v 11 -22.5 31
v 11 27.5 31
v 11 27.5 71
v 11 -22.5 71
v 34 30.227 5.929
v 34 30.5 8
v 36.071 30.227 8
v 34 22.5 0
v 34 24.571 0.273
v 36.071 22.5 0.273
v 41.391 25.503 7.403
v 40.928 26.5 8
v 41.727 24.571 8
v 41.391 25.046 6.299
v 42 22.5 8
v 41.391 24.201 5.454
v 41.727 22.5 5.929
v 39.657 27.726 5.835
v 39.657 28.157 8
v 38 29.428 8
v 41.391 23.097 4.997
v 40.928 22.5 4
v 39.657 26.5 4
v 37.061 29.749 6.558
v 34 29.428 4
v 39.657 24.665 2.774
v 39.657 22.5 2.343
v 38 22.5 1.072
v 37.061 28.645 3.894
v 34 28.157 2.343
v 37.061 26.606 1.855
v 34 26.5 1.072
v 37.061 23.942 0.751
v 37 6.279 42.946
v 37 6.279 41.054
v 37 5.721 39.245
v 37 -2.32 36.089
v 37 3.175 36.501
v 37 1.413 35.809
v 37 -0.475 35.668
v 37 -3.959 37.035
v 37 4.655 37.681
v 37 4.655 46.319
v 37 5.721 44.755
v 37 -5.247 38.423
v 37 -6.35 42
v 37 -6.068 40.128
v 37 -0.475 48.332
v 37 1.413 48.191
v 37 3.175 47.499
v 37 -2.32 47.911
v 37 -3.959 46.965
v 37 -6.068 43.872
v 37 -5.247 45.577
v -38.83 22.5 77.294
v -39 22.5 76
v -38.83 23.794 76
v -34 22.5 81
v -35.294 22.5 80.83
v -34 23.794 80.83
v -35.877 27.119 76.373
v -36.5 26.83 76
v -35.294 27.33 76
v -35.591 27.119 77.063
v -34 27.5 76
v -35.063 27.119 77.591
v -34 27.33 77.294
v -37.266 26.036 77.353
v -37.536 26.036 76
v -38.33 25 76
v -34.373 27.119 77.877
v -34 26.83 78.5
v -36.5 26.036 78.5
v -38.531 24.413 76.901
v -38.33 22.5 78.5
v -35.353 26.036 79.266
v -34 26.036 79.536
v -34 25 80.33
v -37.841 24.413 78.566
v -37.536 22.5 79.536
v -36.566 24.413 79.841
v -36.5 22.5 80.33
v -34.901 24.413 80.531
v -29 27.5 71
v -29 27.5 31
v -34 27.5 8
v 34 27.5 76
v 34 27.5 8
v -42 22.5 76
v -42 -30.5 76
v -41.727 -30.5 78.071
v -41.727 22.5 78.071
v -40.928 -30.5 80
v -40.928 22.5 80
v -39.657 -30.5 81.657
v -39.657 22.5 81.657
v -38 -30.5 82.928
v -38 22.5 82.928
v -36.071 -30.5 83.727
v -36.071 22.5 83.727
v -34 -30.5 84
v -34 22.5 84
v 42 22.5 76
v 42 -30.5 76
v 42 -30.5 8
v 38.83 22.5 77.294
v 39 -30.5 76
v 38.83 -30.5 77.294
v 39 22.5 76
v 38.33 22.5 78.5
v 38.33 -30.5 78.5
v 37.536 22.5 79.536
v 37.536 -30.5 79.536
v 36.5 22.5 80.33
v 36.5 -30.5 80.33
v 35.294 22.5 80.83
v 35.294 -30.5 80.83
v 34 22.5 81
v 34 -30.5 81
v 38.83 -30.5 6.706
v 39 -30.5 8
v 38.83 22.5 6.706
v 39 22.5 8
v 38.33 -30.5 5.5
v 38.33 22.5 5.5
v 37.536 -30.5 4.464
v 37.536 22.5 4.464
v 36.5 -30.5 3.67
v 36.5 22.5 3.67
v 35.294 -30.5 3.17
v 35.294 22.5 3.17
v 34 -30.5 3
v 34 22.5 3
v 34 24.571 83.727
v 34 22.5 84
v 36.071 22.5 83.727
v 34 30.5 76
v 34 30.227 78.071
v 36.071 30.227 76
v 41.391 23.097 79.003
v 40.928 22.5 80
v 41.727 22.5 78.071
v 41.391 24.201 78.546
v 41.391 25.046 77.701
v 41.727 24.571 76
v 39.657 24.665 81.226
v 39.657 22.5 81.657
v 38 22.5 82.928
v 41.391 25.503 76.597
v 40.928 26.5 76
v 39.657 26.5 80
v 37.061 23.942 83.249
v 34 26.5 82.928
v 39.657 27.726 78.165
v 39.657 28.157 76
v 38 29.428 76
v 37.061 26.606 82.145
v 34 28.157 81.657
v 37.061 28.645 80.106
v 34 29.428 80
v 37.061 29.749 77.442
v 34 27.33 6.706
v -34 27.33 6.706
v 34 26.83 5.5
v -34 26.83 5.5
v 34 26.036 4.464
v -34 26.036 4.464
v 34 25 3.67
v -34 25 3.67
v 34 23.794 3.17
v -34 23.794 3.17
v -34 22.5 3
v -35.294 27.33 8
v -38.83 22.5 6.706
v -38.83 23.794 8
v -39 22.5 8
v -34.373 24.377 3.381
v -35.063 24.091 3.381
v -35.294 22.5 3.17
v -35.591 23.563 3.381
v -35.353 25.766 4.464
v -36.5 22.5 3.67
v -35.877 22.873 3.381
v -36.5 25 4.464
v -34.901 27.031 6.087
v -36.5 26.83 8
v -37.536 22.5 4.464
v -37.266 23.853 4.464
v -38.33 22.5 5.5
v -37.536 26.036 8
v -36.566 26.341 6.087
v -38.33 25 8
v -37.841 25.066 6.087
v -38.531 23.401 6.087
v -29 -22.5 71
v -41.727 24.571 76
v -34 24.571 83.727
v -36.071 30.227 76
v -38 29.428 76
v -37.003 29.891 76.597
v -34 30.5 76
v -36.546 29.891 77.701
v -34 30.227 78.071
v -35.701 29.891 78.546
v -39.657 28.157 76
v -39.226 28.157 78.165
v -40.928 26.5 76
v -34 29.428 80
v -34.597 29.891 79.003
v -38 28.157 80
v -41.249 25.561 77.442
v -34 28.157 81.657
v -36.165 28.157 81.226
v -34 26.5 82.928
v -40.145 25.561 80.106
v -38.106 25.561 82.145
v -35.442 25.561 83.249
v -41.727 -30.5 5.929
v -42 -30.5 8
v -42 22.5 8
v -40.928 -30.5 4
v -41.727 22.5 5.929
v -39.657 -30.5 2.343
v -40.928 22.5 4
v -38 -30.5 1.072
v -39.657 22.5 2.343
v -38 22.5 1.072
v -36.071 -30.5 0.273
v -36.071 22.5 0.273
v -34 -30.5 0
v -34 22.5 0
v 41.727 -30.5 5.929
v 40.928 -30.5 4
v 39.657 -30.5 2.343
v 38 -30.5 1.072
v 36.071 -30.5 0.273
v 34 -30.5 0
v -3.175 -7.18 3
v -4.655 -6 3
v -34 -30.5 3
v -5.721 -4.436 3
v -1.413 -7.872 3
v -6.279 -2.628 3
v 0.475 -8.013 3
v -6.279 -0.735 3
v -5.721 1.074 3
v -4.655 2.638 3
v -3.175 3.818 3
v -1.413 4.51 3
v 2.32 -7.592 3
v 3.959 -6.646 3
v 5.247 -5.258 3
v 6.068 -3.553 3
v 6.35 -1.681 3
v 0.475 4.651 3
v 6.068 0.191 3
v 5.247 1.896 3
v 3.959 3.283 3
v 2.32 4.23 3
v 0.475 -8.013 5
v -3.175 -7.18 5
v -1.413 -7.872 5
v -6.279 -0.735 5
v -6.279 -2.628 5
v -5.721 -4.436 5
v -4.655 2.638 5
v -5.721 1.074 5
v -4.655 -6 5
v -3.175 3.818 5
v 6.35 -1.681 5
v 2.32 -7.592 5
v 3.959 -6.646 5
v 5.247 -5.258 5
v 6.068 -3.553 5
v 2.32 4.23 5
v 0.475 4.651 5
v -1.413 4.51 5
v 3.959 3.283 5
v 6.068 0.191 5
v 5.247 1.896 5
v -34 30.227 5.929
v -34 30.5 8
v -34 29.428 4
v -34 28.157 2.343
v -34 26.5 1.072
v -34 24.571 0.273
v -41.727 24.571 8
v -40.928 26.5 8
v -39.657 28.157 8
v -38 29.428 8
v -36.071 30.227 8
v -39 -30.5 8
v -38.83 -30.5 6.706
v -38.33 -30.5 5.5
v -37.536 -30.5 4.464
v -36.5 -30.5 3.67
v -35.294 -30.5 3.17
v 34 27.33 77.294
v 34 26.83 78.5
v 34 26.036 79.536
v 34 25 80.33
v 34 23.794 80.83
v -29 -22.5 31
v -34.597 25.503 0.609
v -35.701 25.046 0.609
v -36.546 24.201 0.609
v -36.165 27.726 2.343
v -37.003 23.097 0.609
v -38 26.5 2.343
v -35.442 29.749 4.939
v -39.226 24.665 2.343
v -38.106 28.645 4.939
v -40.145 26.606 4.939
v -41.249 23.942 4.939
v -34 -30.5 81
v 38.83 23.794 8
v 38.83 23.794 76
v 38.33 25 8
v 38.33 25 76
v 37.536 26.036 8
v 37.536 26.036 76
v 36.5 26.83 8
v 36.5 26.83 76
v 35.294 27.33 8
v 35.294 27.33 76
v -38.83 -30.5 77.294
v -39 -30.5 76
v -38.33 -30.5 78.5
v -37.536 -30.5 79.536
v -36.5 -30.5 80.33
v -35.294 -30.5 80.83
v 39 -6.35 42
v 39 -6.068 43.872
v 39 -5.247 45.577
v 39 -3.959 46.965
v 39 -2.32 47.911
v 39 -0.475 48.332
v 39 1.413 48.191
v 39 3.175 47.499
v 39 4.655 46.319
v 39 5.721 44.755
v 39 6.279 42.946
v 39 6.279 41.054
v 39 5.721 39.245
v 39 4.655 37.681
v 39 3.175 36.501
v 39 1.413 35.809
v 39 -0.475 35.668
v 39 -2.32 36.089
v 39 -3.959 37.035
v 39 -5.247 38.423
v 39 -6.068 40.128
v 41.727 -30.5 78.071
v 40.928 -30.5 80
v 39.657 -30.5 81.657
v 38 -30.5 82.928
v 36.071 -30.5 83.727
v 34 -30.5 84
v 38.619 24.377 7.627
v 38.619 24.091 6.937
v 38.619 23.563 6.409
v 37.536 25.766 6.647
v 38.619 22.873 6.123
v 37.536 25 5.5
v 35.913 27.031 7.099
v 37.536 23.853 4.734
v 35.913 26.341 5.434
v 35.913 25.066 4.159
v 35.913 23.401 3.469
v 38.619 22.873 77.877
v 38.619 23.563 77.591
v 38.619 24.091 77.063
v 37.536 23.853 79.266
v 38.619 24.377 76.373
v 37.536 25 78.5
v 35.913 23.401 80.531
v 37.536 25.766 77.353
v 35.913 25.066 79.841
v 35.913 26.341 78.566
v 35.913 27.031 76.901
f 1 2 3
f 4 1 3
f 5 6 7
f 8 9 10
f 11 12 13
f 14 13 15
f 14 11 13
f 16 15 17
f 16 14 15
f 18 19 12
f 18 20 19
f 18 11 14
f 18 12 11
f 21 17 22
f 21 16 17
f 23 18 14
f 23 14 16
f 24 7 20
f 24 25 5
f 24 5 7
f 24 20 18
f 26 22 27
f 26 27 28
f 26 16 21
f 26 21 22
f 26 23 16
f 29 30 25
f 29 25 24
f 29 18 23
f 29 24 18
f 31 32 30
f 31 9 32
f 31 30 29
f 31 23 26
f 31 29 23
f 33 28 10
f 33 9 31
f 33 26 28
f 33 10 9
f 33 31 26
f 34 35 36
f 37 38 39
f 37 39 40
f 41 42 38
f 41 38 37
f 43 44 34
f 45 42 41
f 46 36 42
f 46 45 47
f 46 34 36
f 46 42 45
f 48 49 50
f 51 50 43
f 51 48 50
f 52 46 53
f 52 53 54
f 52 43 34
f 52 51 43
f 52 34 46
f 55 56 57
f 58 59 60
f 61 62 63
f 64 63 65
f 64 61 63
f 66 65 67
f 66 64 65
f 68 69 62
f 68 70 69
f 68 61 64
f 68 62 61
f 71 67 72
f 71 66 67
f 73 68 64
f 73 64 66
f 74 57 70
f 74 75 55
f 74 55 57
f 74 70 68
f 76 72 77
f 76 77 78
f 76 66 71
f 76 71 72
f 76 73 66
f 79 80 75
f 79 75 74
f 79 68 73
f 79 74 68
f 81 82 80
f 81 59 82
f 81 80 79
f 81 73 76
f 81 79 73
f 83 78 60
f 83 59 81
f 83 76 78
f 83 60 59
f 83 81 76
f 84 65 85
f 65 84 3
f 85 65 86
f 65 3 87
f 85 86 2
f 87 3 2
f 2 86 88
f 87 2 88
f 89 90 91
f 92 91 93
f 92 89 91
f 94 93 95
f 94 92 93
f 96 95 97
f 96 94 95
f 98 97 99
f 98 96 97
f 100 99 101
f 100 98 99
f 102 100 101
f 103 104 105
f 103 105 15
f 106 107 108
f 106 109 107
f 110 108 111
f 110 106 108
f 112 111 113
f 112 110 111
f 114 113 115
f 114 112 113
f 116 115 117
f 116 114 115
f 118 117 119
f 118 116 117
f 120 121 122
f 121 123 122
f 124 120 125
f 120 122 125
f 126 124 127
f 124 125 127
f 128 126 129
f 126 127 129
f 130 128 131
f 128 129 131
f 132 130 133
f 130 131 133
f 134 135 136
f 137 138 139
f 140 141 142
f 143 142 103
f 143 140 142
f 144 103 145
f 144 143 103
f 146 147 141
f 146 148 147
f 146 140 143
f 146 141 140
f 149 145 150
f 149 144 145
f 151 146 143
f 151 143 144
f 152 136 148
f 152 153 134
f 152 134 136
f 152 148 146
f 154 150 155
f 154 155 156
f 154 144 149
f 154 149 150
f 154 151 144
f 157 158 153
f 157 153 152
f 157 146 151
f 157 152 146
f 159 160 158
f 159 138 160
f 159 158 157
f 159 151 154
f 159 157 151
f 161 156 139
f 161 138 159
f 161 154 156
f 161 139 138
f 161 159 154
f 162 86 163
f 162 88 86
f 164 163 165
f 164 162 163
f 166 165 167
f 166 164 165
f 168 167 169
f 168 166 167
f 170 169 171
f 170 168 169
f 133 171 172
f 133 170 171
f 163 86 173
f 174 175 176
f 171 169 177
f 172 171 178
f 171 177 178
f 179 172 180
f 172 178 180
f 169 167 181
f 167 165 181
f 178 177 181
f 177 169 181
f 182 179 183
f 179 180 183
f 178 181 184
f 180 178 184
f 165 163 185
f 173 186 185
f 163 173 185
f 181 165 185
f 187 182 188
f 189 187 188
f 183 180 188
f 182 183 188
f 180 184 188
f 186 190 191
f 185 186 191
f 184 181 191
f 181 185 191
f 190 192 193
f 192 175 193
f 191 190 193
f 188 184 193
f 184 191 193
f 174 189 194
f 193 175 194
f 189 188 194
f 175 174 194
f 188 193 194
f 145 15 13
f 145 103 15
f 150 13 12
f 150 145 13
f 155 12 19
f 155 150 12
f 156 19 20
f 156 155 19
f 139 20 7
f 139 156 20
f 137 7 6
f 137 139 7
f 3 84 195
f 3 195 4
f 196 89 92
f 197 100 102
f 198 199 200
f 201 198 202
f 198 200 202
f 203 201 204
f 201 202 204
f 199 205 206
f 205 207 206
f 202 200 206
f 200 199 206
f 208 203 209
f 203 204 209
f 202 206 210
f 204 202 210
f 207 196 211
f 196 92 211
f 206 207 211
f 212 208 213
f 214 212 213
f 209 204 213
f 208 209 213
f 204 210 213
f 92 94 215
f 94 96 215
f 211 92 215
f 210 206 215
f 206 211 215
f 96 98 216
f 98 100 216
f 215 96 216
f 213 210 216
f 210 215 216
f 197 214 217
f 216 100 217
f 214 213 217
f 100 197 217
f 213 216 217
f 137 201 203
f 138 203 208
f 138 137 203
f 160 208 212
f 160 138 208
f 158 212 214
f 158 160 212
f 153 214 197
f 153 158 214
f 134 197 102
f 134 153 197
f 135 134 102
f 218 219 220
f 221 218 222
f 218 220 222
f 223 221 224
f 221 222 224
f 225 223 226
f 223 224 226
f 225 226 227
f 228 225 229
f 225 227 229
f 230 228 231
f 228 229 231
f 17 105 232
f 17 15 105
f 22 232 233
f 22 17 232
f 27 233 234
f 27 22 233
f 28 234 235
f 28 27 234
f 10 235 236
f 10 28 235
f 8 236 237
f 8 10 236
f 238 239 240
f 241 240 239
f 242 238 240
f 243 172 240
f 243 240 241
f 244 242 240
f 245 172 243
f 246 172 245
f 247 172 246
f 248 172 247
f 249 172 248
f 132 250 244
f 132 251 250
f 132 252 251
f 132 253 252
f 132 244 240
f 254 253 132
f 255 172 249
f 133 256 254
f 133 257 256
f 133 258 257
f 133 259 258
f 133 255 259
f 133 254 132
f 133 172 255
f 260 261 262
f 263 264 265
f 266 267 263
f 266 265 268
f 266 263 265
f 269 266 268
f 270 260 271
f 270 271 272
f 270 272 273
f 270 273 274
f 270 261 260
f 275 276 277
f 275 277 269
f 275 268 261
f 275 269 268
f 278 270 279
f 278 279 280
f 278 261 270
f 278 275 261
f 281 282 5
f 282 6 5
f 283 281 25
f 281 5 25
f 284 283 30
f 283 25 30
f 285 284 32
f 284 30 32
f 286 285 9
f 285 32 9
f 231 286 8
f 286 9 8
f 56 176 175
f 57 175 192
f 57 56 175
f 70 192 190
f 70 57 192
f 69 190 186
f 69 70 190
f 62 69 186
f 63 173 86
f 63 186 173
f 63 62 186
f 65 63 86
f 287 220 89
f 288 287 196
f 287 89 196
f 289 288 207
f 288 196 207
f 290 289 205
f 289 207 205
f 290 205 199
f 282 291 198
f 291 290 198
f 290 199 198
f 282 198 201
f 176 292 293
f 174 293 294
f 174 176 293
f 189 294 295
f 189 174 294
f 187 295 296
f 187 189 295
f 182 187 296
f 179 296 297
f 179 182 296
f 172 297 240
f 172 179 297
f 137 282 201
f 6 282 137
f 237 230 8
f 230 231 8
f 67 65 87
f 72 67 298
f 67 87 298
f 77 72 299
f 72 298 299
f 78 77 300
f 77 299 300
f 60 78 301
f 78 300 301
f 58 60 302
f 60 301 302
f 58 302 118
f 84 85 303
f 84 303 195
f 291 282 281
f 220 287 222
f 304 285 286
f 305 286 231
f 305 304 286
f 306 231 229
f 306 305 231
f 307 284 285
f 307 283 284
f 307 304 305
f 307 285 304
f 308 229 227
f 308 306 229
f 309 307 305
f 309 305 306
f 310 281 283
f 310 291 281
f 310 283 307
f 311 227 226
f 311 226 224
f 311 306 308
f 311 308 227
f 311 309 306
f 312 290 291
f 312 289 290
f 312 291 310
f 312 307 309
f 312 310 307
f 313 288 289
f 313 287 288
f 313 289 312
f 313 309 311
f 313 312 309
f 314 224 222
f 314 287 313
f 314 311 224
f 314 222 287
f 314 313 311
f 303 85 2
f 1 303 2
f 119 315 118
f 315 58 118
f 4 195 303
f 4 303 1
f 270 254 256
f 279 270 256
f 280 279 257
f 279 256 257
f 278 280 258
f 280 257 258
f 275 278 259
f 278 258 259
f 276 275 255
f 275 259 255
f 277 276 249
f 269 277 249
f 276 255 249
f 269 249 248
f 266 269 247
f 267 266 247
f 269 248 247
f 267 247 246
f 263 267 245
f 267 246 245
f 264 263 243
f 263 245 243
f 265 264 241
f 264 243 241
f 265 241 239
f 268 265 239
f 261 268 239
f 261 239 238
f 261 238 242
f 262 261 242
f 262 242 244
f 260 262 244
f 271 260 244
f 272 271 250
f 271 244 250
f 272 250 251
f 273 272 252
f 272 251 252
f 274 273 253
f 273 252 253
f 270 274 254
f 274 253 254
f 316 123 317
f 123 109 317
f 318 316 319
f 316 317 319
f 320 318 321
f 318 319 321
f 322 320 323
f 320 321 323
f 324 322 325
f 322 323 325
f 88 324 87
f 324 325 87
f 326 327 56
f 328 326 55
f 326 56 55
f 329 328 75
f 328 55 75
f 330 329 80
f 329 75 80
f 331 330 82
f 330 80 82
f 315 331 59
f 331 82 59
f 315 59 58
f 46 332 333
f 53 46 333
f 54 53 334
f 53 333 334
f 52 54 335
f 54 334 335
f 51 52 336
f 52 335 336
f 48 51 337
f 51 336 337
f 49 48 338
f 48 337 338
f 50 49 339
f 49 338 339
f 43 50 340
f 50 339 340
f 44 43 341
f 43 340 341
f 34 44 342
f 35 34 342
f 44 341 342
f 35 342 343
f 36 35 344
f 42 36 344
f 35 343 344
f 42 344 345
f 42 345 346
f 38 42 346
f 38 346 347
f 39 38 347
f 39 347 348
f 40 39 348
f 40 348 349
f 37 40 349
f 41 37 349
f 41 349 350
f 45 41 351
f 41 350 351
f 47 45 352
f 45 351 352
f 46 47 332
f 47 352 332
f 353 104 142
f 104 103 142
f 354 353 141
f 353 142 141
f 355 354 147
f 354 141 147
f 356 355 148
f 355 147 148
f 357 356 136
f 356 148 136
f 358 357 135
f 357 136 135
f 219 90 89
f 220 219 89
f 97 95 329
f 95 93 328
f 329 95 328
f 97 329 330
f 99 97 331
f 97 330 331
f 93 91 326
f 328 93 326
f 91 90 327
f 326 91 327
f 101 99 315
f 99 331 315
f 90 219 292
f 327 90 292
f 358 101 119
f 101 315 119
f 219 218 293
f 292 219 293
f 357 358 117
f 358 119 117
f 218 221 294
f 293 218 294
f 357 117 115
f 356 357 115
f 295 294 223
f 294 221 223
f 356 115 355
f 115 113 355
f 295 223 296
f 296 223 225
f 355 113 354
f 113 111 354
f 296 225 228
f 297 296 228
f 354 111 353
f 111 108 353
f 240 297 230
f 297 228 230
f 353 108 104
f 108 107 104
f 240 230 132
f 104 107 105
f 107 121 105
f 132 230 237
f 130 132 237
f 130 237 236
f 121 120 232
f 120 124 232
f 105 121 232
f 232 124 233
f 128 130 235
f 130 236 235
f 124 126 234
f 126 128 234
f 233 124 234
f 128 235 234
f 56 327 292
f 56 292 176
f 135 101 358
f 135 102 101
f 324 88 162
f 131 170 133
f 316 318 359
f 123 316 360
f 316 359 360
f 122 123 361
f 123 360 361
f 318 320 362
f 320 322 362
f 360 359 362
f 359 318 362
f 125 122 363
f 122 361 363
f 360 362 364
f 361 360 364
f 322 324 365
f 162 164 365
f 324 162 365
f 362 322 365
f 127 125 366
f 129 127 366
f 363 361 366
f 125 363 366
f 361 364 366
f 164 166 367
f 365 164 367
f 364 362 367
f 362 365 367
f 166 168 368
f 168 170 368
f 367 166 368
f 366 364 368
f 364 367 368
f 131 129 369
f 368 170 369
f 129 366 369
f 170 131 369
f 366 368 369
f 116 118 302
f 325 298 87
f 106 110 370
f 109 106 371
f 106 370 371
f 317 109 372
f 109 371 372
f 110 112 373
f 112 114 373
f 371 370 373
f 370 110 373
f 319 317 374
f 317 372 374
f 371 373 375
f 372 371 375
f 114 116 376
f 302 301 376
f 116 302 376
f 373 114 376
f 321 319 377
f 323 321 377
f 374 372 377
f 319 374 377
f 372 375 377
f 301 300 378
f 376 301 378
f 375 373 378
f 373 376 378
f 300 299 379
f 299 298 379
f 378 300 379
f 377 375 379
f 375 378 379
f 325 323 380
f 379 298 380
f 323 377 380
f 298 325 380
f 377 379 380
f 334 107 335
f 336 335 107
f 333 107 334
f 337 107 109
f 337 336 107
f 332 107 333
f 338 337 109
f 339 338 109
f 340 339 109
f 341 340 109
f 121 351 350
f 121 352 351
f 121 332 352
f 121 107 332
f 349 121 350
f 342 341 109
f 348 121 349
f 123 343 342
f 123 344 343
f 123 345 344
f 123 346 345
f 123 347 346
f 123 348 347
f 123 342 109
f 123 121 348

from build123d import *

# Parameters (mm, degrees)
F0_W     = 84
F0_H     = 61
F1_DEPTH = 84
F2_R     = 8
F3_T     = -3
F4_R     = 6.35
F5_DEPTH = 2
F6_R     = 6.35
F7_DEPTH = 2
F8_W     = 40
F8_H     = 40
F9_DEPTH = 50


with BuildPart() as f1:
    # F0 (on Top) → F1 (new body)
    with BuildSketch(Plane.XY):
        Rectangle(F0_W, F0_H)
    extrude(amount=F1_DEPTH)

    # F2
    f2_edges = [f1.edges().sort_by_distance(p)[0] for p in [
        (-42, 0, 84),
        (-42, 30.5, 42),
        (0, 30.5, 84),
        (0, 30.5, 0),
        (-42, 0, 0),
        (42, 0, 84),
        (42, 30.5, 42),
        (42, 0, 0),
    ]]
    fillet(f2_edges, radius=F2_R)

    # F3
    f3_openings = [f1.faces().sort_by_distance(p)[0] for p in [
        (0, -30.5, 42),
    ]]
    offset(amount=F3_T, openings=f3_openings)

    # F4 (on face) → F5 (join)
    with BuildSketch(Plane.XY.offset(3)):
        with Locations((0, -1.681145)):
            Circle(F4_R)
    extrude(amount=F5_DEPTH)

    # F6 (on face) → F7 (join)
    with BuildSketch(Plane(origin=(39, 0, 0), x_dir=(0, -1, 0), z_dir=(-1, 0, 0))):
        with Locations((0, 42)):
            Circle(F6_R)
    extrude(amount=F7_DEPTH)

    # F8 (on face) → F9 (join)
    with BuildSketch(Plane.XZ.offset(-27.5)):
        with Locations((-9, 51)):
            Rectangle(F8_W, F8_H)
    extrude(amount=F9_DEPTH)


solid = f1.part
